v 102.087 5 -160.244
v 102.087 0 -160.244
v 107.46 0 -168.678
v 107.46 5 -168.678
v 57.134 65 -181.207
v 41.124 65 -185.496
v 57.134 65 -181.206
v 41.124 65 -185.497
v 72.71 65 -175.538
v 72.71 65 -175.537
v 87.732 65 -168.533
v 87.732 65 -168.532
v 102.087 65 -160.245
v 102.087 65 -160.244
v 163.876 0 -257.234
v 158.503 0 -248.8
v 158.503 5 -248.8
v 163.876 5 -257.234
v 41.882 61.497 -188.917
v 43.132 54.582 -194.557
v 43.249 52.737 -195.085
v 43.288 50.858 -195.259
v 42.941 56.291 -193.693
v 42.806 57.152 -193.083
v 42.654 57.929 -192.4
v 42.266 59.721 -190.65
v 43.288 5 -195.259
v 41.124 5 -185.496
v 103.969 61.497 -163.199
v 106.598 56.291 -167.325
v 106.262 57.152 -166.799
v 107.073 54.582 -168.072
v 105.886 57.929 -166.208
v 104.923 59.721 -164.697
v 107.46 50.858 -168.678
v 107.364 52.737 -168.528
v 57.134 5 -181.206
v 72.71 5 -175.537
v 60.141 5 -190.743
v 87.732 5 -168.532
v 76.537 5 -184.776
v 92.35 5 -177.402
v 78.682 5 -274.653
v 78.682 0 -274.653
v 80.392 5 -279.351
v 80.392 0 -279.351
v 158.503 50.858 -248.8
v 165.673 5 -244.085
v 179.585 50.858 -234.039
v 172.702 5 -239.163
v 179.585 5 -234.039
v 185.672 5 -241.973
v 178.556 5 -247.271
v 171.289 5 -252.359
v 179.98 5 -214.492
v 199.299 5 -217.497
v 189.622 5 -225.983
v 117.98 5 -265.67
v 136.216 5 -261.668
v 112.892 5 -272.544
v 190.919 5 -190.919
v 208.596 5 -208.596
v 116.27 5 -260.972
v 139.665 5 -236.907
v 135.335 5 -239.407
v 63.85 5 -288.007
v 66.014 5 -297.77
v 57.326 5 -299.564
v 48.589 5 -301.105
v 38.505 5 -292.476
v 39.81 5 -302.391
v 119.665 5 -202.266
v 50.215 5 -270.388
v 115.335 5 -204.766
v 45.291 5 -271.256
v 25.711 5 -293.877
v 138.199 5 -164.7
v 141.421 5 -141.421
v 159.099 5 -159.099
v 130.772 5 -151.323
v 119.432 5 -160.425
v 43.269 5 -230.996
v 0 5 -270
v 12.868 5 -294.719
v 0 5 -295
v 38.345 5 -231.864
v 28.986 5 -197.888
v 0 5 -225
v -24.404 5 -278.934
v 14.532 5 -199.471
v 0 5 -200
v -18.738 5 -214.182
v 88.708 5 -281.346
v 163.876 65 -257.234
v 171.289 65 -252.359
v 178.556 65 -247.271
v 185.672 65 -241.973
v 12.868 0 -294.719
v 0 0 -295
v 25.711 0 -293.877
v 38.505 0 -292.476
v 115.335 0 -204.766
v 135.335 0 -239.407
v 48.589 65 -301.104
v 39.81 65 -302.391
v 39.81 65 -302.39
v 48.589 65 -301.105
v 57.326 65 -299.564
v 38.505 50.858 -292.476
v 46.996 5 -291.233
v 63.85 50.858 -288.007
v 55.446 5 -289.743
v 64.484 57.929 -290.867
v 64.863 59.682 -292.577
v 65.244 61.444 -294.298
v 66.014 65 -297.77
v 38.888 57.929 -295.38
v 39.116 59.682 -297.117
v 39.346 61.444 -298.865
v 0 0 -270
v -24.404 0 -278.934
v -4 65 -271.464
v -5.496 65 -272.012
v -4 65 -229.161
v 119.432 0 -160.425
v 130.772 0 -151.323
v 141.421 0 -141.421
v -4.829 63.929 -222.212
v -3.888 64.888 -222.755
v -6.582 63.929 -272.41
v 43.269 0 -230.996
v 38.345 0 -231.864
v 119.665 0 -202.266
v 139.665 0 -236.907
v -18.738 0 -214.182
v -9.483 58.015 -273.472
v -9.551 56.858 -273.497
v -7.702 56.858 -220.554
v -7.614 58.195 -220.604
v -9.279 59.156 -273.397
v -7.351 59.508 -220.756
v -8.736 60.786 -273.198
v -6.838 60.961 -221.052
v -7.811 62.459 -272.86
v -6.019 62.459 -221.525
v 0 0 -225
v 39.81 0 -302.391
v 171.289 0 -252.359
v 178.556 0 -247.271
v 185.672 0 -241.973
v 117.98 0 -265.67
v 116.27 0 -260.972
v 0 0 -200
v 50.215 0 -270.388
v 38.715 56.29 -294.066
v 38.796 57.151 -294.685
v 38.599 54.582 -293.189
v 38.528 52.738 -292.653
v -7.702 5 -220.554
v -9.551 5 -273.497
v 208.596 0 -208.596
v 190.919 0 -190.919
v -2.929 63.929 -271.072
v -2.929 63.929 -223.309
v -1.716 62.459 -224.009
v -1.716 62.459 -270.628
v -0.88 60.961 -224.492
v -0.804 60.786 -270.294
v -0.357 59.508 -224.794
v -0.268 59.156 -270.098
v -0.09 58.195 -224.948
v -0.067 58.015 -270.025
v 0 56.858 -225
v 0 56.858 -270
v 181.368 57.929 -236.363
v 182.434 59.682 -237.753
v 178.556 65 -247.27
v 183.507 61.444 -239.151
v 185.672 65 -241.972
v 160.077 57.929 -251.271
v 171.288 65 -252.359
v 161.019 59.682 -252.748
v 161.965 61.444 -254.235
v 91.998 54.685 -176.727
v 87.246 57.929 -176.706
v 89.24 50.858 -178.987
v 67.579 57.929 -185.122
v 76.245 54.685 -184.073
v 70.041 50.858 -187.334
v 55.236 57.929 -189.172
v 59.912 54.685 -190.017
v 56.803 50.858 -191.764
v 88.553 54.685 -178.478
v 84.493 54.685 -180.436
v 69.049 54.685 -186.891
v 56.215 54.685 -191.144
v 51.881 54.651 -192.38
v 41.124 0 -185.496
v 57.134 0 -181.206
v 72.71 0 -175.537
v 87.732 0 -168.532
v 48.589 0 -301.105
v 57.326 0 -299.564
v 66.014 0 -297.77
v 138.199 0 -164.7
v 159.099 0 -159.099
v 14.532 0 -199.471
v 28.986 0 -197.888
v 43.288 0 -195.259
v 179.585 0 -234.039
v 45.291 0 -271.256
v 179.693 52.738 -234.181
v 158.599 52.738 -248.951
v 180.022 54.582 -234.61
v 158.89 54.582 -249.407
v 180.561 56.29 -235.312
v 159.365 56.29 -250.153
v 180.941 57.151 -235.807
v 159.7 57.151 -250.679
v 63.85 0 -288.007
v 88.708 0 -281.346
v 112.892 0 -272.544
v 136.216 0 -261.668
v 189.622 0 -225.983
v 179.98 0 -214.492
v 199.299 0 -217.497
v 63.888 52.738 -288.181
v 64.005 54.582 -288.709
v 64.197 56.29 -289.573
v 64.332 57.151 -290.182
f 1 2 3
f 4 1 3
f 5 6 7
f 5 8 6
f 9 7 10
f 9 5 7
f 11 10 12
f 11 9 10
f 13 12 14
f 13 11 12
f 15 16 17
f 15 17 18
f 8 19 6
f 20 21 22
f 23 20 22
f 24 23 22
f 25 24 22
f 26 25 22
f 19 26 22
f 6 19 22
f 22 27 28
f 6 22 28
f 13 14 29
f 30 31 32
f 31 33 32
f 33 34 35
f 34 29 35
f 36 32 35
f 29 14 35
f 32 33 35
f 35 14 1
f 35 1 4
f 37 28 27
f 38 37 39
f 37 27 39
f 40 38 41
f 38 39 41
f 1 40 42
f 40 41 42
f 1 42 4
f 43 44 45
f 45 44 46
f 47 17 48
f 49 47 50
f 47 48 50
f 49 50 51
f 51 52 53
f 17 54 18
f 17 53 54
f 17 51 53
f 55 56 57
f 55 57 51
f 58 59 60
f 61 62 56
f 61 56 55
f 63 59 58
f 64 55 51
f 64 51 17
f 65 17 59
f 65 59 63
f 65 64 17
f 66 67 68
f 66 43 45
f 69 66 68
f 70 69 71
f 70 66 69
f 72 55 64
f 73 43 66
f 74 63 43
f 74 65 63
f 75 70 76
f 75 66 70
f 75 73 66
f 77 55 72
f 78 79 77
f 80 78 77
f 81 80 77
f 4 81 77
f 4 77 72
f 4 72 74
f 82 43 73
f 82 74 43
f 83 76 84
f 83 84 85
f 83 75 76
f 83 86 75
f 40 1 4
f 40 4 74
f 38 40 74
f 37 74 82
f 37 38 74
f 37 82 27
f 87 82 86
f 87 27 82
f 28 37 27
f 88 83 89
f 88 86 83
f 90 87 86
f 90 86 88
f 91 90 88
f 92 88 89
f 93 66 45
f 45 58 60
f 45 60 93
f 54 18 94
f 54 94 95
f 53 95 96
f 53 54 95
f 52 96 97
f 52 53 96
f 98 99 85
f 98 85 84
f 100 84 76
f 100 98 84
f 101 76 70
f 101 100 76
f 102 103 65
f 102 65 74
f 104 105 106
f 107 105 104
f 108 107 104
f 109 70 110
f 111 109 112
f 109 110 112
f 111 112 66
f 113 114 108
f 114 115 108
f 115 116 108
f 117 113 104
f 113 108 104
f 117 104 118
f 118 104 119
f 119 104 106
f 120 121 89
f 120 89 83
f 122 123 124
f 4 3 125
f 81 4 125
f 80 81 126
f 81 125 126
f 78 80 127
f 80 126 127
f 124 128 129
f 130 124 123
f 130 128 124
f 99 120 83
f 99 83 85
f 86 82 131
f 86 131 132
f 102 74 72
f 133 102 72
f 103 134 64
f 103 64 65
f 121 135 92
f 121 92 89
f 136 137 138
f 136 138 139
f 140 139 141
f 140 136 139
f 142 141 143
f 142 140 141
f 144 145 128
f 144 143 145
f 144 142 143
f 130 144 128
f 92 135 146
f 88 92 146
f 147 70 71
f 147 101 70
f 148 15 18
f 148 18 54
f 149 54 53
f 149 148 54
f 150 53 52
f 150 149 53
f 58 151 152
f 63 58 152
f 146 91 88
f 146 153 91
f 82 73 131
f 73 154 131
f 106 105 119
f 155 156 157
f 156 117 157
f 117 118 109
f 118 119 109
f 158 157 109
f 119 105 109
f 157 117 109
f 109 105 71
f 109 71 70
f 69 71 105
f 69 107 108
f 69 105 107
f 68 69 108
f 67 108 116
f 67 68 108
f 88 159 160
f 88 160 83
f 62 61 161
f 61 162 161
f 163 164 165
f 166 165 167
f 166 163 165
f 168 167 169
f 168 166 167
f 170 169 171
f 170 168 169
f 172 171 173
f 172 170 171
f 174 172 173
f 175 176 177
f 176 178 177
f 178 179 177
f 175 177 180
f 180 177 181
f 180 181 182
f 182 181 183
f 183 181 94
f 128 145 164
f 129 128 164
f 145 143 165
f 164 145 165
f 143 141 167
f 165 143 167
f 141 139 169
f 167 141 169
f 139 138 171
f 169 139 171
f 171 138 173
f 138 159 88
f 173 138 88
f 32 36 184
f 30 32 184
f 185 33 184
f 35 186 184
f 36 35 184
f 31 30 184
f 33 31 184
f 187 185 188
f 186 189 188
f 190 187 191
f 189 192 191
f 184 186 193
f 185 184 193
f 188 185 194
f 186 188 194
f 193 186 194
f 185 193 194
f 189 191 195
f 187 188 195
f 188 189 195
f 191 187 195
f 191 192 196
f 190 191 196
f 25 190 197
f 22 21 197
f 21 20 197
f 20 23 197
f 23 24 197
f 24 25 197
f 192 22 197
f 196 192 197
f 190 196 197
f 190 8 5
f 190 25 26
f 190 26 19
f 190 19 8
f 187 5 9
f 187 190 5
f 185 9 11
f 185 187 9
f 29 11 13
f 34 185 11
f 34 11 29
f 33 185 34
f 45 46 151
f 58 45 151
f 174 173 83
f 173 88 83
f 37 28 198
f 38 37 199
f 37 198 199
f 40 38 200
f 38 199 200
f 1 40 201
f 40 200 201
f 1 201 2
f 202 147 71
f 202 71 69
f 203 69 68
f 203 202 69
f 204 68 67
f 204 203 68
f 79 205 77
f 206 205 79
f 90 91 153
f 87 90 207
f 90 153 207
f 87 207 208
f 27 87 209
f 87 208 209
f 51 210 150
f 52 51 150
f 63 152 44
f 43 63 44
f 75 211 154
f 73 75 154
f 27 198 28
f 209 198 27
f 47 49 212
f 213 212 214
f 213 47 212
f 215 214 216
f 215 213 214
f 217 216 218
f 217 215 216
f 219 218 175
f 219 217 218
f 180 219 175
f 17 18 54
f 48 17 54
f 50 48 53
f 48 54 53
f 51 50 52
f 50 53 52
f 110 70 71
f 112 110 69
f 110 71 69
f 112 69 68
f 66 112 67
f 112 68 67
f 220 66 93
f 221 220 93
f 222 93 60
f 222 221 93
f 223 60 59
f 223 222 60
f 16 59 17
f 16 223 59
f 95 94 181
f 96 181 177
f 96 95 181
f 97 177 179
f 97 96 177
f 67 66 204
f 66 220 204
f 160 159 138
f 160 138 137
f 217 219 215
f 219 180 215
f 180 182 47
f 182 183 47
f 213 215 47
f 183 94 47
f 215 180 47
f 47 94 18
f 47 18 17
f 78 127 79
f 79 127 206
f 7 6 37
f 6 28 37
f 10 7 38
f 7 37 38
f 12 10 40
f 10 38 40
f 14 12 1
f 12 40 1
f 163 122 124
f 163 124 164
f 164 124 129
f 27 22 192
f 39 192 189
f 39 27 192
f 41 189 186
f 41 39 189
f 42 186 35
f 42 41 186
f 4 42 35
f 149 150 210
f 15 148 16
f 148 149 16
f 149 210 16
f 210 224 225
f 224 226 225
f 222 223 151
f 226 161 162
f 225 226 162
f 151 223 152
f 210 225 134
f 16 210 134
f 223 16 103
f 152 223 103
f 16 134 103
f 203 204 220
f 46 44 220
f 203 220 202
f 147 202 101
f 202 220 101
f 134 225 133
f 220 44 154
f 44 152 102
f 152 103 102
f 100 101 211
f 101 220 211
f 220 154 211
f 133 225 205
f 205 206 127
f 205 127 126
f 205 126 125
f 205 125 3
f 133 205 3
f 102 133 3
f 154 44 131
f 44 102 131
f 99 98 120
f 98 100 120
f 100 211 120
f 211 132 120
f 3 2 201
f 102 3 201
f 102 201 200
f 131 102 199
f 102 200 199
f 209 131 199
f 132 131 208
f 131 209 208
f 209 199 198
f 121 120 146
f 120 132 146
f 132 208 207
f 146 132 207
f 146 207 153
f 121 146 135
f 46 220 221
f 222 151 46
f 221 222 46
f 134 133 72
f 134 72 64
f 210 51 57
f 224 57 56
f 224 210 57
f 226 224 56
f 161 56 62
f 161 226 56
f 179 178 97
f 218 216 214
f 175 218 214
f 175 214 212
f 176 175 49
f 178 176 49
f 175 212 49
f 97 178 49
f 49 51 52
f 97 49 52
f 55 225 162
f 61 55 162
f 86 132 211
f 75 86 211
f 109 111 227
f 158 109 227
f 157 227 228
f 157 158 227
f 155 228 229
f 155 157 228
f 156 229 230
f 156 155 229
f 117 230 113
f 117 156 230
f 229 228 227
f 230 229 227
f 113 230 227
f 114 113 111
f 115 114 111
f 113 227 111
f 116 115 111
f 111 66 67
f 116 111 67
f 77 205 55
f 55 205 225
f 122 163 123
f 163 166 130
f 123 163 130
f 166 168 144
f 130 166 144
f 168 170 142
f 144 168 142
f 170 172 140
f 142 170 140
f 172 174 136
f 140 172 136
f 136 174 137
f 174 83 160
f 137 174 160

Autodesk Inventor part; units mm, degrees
ref_plane "YZ Plane" through (0, 0, 0) normal (1, 0, 0) x (0, 1, 0)
ref_plane "XZ Plane" through (0, 0, 0) normal (0, 1, 0) x (-1, 0, 0)
ref_plane "XY Plane" through (0, 0, 0) normal (0, 0, 1) x (1, 0, 0)
sketch "Sketch1" plane through (0, 0, 0) normal (0, 1, 0) x (-1, 0, 0)
  circle A0 centre (0, 0) radius 215
  circle A1 centre (0, 0) radius 280
  circle A2 centre (0, 0) radius 200
  circle A3 centre (0, 0) radius 295
  circle A4 centre (0, 0) radius 270
  circle A5 centre (0, 0) radius 225
  line L0 (0, 0) -> (0, -295)
  line L1 (0, 0) -> (-208.5965, -208.5965)
  line L2 (0, 0) -> (-189.6223, -225.9831)
  line L3 (0, 0) -> (25.7109, -293.8774)
  line L4 (24.4036, -278.9345) -> (0, -270)
  line L5 (18.7385, -214.1819) -> (0, -225)
  line L6 (-138.1993, -164.6996) -> (-159.099, -159.099)
  line L7 (-179.9805, -214.4924) -> (-190.9188, -190.9188)
  line L8 (0, 0) -> (-100.8959, -277.2093) construction
  circle A6 centre (0, 0) radius 235 construction
  circle A7 centre (0, 0) radius 275 construction
  circle A8 centre (0, 0) radius 325 construction
  circle A9 centre (0, 0) radius 255 construction
  circle A10 centre (0, 0) radius 285 construction
  line L9 (-80.392, -279.3513) -> (-117.9797, -265.6705)
  line L10 (-117.9797, -265.6705) -> (-116.2696, -260.972)
  line L11 (-116.2696, -260.972) -> (-78.6819, -274.6528)
  line L12 (-78.6819, -274.6528) -> (-80.392, -279.3513)
  line L13 (-80.392, -279.3513) -> (-116.2696, -260.972) construction
  line L14 (-117.9797, -265.6705) -> (-78.6819, -274.6528) construction
  line L15 (-98.3308, -270.1616) -> (-99.1858, -272.5109) construction
  line L16 (-139.6651, -236.907) -> (-135.335, -239.407)
  line L17 (-135.335, -239.407) -> (-115.335, -204.766)
  line L18 (-115.335, -204.766) -> (-119.6651, -202.266)
  line L19 (-119.6651, -202.266) -> (-139.6651, -236.907)
  line L20 (-139.6651, -236.907) -> (-115.335, -204.766) construction
  line L21 (-135.335, -239.407) -> (-119.6651, -202.266) construction
  line L22 (-137.5, -238.157) -> (-117.5, -203.516) construction
  circle A11 centre (0, 0) radius 275 construction
  line L23 (-45.2912, -271.2563) -> (-50.2152, -270.388)
  line L24 (-50.2152, -270.388) -> (-43.2693, -230.9957)
  line L25 (-43.2693, -230.9957) -> (-38.3453, -231.8639)
  line L26 (-38.3453, -231.8639) -> (-45.2912, -271.2563)
  line L27 (-45.2912, -271.2563) -> (-43.2693, -230.9957) construction
  line L28 (-50.2152, -270.388) -> (-38.3453, -231.8639) construction
  line L29 (-47.7532, -270.8221) -> (-40.8073, -231.4298) construction
  circle A12 centre (0, 0) radius 165 construction
  point P0 (0, -200)
  point P1 (-141.4214, -141.4214)
  point P2 (23.5321, -268.9726)
  point P3 (-127.5, -220.8365)
  point P4 (-44.2803, -251.126)
  dimension "d3" = 430
  dimension "d5" = 15
  dimension "d7" = 45
  dimension "d8" = 5
  dimension "d9" = 5
  dimension "d10" = 10
  dimension "d12" = 10
  dimension "d15" = 20
  dimension "d18" = 590
  dimension "d19" = 650
  dimension "d20" = 90
  dimension "d24" = 20
  dimension "d29" = 5
  dimension "d30" = 40
  dimension "d33" = 5
  dimension "d34" = 40
  dimension "d37" = 40
  dimension "d41" = 330
  dimension "d42" = 35
  dimension "d45" = 10
extrude "Extrusion1" add sketch "Sketch1" along normal blind 5 contours L3 A5 L5 | L0 A5 L2 A0 | A0 L2 A2 L0 | L3 A4 L0 A5 | L0 A4 L26 L25 L24 L17 L18 L19 L2 A5 | L1 A2 L2 A0 | A0 L6 L1 | L3 L4 A4 | L0 A1 L2 A4 L19 L16 L17 L24 L23 L26 | L0 A3 L2 A1 | L7 A1 L1 | L2 A3 L1 A1
sketch "Sketch2" plane through (0, 0, 0) normal (0, -1, 0) x (1, 0, 0)
  line L0 (179.9805, -214.4924) -> (190.9188, -190.9188) projected
  line L1 (190.9188, -190.9188) -> (208.5965, -208.5965) projected
  arc A0 (0, -295) -> (208.5965, -208.5965) centre (0, 0) ccw projected
  line L2 (0, -295) -> (0, -270) projected
  line L3 (0, -270) -> (-24.4036, -278.9345) projected
  line L4 (-24.4036, -278.9345) -> (-18.7385, -214.1819) projected
  line L5 (-18.7385, -214.1819) -> (0, -225) projected
  line L6 (0, -225) -> (0, -200) projected
  arc A1 (0, -200) -> (141.4214, -141.4214) centre (0, 0) ccw projected
  line L7 (141.4214, -141.4214) -> (159.099, -159.099) projected
  line L8 (159.099, -159.099) -> (138.1993, -164.6996) projected
  line L9 (138.1993, -164.6996) -> (179.9805, -214.4924) projected
  line L10 (115.335, -204.766) -> (135.335, -239.407) projected
  line L11 (135.335, -239.407) -> (139.6651, -236.907) projected
  line L12 (139.6651, -236.907) -> (119.6651, -202.266) projected
  line L13 (119.6651, -202.266) -> (115.335, -204.766) projected
  line L14 (50.2152, -270.388) -> (43.2693, -230.9957) projected
  line L15 (43.2693, -230.9957) -> (38.3453, -231.8639) projected
  line L16 (38.3453, -231.8639) -> (45.2912, -271.2563) projected
  line L17 (45.2912, -271.2563) -> (50.2152, -270.388) projected
  line L18 (80.392, -279.3513) -> (117.9797, -265.6705) projected
  line L19 (117.9797, -265.6705) -> (116.2696, -260.972) projected
  line L20 (116.2696, -260.972) -> (78.6819, -274.6528) projected
  line L21 (78.6819, -274.6528) -> (80.392, -279.3513) projected
  circle A2 centre (0, 0) radius 200
  circle A3 centre (0, 0) radius 295
  circle A4 centre (0, 0) radius 305
  circle A5 centre (0, 0) radius 190
  line L22 (0, 0) -> (51.7638, -193.1852)
  arc A6 (0, -200) -> (141.4214, -141.4214) centre (0, 0) ccw projected
  line L23 (0, 0) -> (100, -173.2051)
  line L24 (0, 0) -> (39.8105, -302.3907)
  line L25 (0, 0) -> (66.0141, -297.7703)
  line L26 (0, 0) -> (163.8764, -257.2344)
  line L27 (0, 0) -> (185.6722, -241.9728)
  line L28 (0, 0) -> (116.7184, -281.7833) construction
  line L29 (0, 0) -> (0, -305) construction
  point P0 (41.1235, -185.4962)
  point P1 (43.2879, -195.2592)
  point P2 (107.4599, -168.6783)
  point P3 (102.0869, -160.2444)
  point P4 (179.5846, -234.0392)
  point P5 (158.5034, -248.8005)
  point P6 (63.8497, -288.0073)
  point P7 (38.5052, -292.4762)
  dimension "d46" = 10
  dimension "d47" = 10
  dimension "d50" = 15
  dimension "d51" = 5
  dimension "d52" = 5
  dimension "d53" = 22.5
  dimension "d54" = 10
  dimension "d55" = 10
  dimension "d56" = 7.5
extrude "Extrusion2" add sketch "Sketch2" against normal blind 5 contours L27 A4 L26 A0 | L25 A4 L24 A0 | A1 L23 A5 L26 | L25 A5 L22 A1 | A1 L22 A5 L23
sketch "Sketch3" plane through (0, 5, 0) normal (0, 1, 0) x (1, 0, 0)
  line L0 (179.9805, 214.4924) -> (190.9188, 190.9188) projected
  line L1 (190.9188, 190.9188) -> (208.5965, 208.5965) projected
  arc A0 (208.5965, 208.5965) -> (179.5846, 234.0392) centre (0, 0) ccw projected
  line L2 (179.5846, 234.0392) -> (185.6722, 241.9728) projected
  arc A1 (185.6722, 241.9728) -> (163.8764, 257.2344) centre (0, 0) ccw projected
  line L3 (163.8764, 257.2344) -> (158.5034, 248.8005) projected
  arc A2 (158.5034, 248.8005) -> (63.8497, 288.0073) centre (0, 0) ccw projected
  line L4 (63.8497, 288.0073) -> (66.0141, 297.7703) projected
  arc A3 (66.0141, 297.7703) -> (39.8105, 302.3907) centre (0, 0) ccw projected
  line L5 (39.8105, 302.3907) -> (38.5052, 292.4762) projected
  arc A4 (38.5052, 292.4762) -> (0, 295) centre (0, 0) ccw projected
  line L6 (0, 295) -> (0, 270) projected
  line L7 (0, 270) -> (-24.4036, 278.9345) projected
  line L8 (-24.4036, 278.9345) -> (-18.7385, 214.1819) projected
  line L9 (-18.7385, 214.1819) -> (0, 225) projected
  line L10 (0, 225) -> (0, 200) projected
  arc A5 (43.2879, 195.2592) -> (0, 200) centre (0, 0) ccw projected
  line L11 (43.2879, 195.2592) -> (41.1235, 185.4962) projected
  arc A6 (102.0869, 160.2444) -> (41.1235, 185.4962) centre (0, 0) ccw projected
  line L12 (102.0869, 160.2444) -> (107.4599, 168.6783) projected
  arc A7 (141.4214, 141.4214) -> (107.4599, 168.6783) centre (0, 0) ccw projected
  line L13 (141.4214, 141.4214) -> (159.099, 159.099) projected
  line L14 (159.099, 159.099) -> (138.1993, 164.6996) projected
  line L15 (138.1993, 164.6996) -> (179.9805, 214.4924) projected
  line L16 (115.335, 204.766) -> (135.335, 239.407) projected
  line L17 (135.335, 239.407) -> (139.6651, 236.907) projected
  line L18 (139.6651, 236.907) -> (119.6651, 202.266) projected
  line L19 (119.6651, 202.266) -> (115.335, 204.766) projected
  line L20 (50.2152, 270.388) -> (43.2693, 230.9957) projected
  line L21 (43.2693, 230.9957) -> (38.3453, 231.8639) projected
  line L22 (38.3453, 231.8639) -> (45.2912, 271.2563) projected
  line L23 (45.2912, 271.2563) -> (50.2152, 270.388) projected
  line L24 (80.392, 279.3513) -> (117.9797, 265.6705) projected
  line L25 (117.9797, 265.6705) -> (116.2696, 260.972) projected
  line L26 (116.2696, 260.972) -> (78.6819, 274.6528) projected
  line L27 (78.6819, 274.6528) -> (80.392, 279.3513) projected
  circle A8 centre (0, 0) radius 190
  circle A9 centre (0, 0) radius 200
  circle A10 centre (0, 0) radius 295
  circle A11 centre (0, 0) radius 305
  line L28 (0, 0) -> (43.2879, 195.2592)
  line L29 (0, 0) -> (107.4599, 168.6783)
  line L30 (0, 0) -> (39.8105, 302.3907)
  line L31 (0, 0) -> (66.0141, 297.7703)
  line L32 (0, 0) -> (163.8764, 257.2344)
  line L33 (0, 0) -> (185.6722, 241.9728)
  line L34 (0, 0) -> (0, 305)
  line L35 (0, 0) -> (-10.6443, 304.8142)
  point P0 (43.2879, 195.2592)
  point P1 (179.5846, 234.0392)
  point P2 (63.8497, 288.0073)
  point P3 (-9.5507, 273.4967)
  point P4 (-7.7019, 220.5535)
  dimension "d59" = 2
extrude "Extrusion3" add sketch "Sketch3" along normal blind 60 separate body contours A10 L3 A1 L2 | A10 L5 A3 L4 | L12 A6 L11 A9 | L7 L34 L9 L35
chamfer "Chamfer1" distance 10 angle 45 3 edges at (51.2262, 65, -290.5183) (76.5367, 65, -184.7759) (169.205, 65, -241.6499)
fillet "Fillet1" radius 10 3 edges at (51.2262, 55.0005, -290.5183) (169.205, 55.0005, -241.6499) (76.5367, 55.0005, -184.7759)
chamfer "Chamfer2" distance 4 angle 45 2 edges at (0, 65, -247.5) (-8.6263, 65, -247.0251)
fillet "Fillet2" radius 10 2 edges at (0, 61, -247.5) (-8.6263, 61, -247.0251)
properties part number "Moving Carousel Upper"
